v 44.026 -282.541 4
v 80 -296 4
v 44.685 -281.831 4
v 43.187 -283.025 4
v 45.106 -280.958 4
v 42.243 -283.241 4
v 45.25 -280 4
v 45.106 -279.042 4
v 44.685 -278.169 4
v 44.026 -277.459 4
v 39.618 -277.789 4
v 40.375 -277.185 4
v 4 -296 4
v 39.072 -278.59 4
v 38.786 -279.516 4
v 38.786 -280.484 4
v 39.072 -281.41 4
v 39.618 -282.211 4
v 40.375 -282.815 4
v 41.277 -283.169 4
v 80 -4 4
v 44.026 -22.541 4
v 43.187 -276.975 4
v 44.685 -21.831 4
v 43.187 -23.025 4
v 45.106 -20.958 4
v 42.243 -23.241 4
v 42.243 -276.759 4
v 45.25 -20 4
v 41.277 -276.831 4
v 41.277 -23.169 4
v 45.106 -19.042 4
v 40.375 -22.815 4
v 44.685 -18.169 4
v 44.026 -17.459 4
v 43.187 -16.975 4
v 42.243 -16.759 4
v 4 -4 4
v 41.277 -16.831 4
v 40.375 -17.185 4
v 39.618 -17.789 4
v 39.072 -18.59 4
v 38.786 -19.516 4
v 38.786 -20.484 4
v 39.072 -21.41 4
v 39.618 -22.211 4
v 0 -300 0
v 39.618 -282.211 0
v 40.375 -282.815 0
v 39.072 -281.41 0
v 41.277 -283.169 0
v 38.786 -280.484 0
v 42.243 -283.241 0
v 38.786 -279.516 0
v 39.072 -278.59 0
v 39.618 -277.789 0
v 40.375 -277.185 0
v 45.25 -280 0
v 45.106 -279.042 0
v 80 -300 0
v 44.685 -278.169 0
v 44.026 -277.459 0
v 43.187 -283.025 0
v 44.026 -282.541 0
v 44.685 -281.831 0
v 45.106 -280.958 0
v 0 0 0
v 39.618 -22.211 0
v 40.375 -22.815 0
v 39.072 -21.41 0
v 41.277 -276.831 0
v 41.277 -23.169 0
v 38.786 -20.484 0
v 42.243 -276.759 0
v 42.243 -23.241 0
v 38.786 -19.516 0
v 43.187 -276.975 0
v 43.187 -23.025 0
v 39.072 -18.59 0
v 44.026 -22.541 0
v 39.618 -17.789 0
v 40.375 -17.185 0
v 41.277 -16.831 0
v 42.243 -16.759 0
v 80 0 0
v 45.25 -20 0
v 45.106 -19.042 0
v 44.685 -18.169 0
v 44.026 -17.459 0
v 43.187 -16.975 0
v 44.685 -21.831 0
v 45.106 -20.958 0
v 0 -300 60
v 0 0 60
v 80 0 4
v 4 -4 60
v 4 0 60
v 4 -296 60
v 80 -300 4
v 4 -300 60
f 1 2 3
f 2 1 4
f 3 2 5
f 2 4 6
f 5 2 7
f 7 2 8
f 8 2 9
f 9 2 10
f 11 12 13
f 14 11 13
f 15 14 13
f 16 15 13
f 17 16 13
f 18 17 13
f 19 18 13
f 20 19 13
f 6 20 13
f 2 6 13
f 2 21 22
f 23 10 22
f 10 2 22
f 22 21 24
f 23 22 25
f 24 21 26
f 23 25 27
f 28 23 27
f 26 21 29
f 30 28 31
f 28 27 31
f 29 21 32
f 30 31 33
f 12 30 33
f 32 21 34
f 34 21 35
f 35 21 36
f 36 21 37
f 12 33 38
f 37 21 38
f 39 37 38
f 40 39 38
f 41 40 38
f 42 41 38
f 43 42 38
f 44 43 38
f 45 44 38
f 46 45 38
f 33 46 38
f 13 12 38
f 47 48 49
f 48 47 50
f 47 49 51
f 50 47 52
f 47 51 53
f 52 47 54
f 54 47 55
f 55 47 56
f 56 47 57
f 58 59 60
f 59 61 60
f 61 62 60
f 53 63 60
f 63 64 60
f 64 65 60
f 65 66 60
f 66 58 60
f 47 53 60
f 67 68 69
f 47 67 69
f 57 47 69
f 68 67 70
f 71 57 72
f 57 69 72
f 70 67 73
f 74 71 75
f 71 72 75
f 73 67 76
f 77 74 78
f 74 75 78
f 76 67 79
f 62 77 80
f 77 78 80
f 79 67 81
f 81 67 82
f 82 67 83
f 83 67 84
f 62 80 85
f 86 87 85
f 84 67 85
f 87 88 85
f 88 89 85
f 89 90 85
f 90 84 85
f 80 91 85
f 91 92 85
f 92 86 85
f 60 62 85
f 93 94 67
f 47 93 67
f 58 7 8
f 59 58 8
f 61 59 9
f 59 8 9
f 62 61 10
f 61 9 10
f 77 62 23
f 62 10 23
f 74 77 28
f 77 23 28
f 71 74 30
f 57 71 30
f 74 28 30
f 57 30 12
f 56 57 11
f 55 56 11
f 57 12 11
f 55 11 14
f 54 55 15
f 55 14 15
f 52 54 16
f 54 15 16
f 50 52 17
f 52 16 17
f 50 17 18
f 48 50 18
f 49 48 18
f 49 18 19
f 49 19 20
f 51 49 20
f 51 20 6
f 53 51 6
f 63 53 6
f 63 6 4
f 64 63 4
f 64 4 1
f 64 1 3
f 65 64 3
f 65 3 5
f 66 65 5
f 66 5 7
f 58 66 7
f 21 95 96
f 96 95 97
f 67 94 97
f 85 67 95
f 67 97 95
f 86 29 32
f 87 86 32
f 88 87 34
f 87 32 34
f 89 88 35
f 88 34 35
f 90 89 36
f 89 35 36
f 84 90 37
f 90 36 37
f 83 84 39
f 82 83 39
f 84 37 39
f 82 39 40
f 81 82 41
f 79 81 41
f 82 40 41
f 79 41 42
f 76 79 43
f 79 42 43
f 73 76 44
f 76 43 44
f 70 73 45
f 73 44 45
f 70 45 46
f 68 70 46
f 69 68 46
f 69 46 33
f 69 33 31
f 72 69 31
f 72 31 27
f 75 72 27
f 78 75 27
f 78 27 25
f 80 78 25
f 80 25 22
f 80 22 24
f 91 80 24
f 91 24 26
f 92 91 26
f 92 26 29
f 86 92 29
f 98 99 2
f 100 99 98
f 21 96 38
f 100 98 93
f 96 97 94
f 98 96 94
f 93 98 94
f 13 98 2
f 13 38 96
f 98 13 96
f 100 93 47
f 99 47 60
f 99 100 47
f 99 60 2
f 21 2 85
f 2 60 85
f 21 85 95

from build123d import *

# Parameters (mm, degrees)
F1_DEPTH = 300
F2_R     = 3.25
F3_DEPTH = 25
F5_DEPTH = 4
F8_DEPTH = 4


with BuildPart() as f1:
    # F0 (on Front) → F1 (new body)
    with BuildSketch(Plane.XZ):
        Polygon((0, 60), (0, 0), (80, 0), (80, 4), (4, 4), (4, 60), align=None)
    extrude(amount=F1_DEPTH)

    # F2 (on face) → F3 (cut)
    with BuildSketch(Plane.XY.offset(4)):
        with Locations((42, -20)):
            Circle(F2_R)
        with Locations((42, -280)):
            Circle(F2_R)
    extrude(amount=-F3_DEPTH, mode=Mode.SUBTRACT)

    # F4 (on Front) → F5 (join)
    with BuildSketch(Plane.XZ):
        Polygon((80, 4), (4, 60), (4, 4), align=None)
    extrude(amount=F5_DEPTH)

    # F7 (on offset) → F8 (join)
    with BuildSketch(Plane.XZ.offset(300)):
        Polygon((80, 4), (4, 60), (4, 4), align=None)
    extrude(amount=-F8_DEPTH)


solid = f1.part
